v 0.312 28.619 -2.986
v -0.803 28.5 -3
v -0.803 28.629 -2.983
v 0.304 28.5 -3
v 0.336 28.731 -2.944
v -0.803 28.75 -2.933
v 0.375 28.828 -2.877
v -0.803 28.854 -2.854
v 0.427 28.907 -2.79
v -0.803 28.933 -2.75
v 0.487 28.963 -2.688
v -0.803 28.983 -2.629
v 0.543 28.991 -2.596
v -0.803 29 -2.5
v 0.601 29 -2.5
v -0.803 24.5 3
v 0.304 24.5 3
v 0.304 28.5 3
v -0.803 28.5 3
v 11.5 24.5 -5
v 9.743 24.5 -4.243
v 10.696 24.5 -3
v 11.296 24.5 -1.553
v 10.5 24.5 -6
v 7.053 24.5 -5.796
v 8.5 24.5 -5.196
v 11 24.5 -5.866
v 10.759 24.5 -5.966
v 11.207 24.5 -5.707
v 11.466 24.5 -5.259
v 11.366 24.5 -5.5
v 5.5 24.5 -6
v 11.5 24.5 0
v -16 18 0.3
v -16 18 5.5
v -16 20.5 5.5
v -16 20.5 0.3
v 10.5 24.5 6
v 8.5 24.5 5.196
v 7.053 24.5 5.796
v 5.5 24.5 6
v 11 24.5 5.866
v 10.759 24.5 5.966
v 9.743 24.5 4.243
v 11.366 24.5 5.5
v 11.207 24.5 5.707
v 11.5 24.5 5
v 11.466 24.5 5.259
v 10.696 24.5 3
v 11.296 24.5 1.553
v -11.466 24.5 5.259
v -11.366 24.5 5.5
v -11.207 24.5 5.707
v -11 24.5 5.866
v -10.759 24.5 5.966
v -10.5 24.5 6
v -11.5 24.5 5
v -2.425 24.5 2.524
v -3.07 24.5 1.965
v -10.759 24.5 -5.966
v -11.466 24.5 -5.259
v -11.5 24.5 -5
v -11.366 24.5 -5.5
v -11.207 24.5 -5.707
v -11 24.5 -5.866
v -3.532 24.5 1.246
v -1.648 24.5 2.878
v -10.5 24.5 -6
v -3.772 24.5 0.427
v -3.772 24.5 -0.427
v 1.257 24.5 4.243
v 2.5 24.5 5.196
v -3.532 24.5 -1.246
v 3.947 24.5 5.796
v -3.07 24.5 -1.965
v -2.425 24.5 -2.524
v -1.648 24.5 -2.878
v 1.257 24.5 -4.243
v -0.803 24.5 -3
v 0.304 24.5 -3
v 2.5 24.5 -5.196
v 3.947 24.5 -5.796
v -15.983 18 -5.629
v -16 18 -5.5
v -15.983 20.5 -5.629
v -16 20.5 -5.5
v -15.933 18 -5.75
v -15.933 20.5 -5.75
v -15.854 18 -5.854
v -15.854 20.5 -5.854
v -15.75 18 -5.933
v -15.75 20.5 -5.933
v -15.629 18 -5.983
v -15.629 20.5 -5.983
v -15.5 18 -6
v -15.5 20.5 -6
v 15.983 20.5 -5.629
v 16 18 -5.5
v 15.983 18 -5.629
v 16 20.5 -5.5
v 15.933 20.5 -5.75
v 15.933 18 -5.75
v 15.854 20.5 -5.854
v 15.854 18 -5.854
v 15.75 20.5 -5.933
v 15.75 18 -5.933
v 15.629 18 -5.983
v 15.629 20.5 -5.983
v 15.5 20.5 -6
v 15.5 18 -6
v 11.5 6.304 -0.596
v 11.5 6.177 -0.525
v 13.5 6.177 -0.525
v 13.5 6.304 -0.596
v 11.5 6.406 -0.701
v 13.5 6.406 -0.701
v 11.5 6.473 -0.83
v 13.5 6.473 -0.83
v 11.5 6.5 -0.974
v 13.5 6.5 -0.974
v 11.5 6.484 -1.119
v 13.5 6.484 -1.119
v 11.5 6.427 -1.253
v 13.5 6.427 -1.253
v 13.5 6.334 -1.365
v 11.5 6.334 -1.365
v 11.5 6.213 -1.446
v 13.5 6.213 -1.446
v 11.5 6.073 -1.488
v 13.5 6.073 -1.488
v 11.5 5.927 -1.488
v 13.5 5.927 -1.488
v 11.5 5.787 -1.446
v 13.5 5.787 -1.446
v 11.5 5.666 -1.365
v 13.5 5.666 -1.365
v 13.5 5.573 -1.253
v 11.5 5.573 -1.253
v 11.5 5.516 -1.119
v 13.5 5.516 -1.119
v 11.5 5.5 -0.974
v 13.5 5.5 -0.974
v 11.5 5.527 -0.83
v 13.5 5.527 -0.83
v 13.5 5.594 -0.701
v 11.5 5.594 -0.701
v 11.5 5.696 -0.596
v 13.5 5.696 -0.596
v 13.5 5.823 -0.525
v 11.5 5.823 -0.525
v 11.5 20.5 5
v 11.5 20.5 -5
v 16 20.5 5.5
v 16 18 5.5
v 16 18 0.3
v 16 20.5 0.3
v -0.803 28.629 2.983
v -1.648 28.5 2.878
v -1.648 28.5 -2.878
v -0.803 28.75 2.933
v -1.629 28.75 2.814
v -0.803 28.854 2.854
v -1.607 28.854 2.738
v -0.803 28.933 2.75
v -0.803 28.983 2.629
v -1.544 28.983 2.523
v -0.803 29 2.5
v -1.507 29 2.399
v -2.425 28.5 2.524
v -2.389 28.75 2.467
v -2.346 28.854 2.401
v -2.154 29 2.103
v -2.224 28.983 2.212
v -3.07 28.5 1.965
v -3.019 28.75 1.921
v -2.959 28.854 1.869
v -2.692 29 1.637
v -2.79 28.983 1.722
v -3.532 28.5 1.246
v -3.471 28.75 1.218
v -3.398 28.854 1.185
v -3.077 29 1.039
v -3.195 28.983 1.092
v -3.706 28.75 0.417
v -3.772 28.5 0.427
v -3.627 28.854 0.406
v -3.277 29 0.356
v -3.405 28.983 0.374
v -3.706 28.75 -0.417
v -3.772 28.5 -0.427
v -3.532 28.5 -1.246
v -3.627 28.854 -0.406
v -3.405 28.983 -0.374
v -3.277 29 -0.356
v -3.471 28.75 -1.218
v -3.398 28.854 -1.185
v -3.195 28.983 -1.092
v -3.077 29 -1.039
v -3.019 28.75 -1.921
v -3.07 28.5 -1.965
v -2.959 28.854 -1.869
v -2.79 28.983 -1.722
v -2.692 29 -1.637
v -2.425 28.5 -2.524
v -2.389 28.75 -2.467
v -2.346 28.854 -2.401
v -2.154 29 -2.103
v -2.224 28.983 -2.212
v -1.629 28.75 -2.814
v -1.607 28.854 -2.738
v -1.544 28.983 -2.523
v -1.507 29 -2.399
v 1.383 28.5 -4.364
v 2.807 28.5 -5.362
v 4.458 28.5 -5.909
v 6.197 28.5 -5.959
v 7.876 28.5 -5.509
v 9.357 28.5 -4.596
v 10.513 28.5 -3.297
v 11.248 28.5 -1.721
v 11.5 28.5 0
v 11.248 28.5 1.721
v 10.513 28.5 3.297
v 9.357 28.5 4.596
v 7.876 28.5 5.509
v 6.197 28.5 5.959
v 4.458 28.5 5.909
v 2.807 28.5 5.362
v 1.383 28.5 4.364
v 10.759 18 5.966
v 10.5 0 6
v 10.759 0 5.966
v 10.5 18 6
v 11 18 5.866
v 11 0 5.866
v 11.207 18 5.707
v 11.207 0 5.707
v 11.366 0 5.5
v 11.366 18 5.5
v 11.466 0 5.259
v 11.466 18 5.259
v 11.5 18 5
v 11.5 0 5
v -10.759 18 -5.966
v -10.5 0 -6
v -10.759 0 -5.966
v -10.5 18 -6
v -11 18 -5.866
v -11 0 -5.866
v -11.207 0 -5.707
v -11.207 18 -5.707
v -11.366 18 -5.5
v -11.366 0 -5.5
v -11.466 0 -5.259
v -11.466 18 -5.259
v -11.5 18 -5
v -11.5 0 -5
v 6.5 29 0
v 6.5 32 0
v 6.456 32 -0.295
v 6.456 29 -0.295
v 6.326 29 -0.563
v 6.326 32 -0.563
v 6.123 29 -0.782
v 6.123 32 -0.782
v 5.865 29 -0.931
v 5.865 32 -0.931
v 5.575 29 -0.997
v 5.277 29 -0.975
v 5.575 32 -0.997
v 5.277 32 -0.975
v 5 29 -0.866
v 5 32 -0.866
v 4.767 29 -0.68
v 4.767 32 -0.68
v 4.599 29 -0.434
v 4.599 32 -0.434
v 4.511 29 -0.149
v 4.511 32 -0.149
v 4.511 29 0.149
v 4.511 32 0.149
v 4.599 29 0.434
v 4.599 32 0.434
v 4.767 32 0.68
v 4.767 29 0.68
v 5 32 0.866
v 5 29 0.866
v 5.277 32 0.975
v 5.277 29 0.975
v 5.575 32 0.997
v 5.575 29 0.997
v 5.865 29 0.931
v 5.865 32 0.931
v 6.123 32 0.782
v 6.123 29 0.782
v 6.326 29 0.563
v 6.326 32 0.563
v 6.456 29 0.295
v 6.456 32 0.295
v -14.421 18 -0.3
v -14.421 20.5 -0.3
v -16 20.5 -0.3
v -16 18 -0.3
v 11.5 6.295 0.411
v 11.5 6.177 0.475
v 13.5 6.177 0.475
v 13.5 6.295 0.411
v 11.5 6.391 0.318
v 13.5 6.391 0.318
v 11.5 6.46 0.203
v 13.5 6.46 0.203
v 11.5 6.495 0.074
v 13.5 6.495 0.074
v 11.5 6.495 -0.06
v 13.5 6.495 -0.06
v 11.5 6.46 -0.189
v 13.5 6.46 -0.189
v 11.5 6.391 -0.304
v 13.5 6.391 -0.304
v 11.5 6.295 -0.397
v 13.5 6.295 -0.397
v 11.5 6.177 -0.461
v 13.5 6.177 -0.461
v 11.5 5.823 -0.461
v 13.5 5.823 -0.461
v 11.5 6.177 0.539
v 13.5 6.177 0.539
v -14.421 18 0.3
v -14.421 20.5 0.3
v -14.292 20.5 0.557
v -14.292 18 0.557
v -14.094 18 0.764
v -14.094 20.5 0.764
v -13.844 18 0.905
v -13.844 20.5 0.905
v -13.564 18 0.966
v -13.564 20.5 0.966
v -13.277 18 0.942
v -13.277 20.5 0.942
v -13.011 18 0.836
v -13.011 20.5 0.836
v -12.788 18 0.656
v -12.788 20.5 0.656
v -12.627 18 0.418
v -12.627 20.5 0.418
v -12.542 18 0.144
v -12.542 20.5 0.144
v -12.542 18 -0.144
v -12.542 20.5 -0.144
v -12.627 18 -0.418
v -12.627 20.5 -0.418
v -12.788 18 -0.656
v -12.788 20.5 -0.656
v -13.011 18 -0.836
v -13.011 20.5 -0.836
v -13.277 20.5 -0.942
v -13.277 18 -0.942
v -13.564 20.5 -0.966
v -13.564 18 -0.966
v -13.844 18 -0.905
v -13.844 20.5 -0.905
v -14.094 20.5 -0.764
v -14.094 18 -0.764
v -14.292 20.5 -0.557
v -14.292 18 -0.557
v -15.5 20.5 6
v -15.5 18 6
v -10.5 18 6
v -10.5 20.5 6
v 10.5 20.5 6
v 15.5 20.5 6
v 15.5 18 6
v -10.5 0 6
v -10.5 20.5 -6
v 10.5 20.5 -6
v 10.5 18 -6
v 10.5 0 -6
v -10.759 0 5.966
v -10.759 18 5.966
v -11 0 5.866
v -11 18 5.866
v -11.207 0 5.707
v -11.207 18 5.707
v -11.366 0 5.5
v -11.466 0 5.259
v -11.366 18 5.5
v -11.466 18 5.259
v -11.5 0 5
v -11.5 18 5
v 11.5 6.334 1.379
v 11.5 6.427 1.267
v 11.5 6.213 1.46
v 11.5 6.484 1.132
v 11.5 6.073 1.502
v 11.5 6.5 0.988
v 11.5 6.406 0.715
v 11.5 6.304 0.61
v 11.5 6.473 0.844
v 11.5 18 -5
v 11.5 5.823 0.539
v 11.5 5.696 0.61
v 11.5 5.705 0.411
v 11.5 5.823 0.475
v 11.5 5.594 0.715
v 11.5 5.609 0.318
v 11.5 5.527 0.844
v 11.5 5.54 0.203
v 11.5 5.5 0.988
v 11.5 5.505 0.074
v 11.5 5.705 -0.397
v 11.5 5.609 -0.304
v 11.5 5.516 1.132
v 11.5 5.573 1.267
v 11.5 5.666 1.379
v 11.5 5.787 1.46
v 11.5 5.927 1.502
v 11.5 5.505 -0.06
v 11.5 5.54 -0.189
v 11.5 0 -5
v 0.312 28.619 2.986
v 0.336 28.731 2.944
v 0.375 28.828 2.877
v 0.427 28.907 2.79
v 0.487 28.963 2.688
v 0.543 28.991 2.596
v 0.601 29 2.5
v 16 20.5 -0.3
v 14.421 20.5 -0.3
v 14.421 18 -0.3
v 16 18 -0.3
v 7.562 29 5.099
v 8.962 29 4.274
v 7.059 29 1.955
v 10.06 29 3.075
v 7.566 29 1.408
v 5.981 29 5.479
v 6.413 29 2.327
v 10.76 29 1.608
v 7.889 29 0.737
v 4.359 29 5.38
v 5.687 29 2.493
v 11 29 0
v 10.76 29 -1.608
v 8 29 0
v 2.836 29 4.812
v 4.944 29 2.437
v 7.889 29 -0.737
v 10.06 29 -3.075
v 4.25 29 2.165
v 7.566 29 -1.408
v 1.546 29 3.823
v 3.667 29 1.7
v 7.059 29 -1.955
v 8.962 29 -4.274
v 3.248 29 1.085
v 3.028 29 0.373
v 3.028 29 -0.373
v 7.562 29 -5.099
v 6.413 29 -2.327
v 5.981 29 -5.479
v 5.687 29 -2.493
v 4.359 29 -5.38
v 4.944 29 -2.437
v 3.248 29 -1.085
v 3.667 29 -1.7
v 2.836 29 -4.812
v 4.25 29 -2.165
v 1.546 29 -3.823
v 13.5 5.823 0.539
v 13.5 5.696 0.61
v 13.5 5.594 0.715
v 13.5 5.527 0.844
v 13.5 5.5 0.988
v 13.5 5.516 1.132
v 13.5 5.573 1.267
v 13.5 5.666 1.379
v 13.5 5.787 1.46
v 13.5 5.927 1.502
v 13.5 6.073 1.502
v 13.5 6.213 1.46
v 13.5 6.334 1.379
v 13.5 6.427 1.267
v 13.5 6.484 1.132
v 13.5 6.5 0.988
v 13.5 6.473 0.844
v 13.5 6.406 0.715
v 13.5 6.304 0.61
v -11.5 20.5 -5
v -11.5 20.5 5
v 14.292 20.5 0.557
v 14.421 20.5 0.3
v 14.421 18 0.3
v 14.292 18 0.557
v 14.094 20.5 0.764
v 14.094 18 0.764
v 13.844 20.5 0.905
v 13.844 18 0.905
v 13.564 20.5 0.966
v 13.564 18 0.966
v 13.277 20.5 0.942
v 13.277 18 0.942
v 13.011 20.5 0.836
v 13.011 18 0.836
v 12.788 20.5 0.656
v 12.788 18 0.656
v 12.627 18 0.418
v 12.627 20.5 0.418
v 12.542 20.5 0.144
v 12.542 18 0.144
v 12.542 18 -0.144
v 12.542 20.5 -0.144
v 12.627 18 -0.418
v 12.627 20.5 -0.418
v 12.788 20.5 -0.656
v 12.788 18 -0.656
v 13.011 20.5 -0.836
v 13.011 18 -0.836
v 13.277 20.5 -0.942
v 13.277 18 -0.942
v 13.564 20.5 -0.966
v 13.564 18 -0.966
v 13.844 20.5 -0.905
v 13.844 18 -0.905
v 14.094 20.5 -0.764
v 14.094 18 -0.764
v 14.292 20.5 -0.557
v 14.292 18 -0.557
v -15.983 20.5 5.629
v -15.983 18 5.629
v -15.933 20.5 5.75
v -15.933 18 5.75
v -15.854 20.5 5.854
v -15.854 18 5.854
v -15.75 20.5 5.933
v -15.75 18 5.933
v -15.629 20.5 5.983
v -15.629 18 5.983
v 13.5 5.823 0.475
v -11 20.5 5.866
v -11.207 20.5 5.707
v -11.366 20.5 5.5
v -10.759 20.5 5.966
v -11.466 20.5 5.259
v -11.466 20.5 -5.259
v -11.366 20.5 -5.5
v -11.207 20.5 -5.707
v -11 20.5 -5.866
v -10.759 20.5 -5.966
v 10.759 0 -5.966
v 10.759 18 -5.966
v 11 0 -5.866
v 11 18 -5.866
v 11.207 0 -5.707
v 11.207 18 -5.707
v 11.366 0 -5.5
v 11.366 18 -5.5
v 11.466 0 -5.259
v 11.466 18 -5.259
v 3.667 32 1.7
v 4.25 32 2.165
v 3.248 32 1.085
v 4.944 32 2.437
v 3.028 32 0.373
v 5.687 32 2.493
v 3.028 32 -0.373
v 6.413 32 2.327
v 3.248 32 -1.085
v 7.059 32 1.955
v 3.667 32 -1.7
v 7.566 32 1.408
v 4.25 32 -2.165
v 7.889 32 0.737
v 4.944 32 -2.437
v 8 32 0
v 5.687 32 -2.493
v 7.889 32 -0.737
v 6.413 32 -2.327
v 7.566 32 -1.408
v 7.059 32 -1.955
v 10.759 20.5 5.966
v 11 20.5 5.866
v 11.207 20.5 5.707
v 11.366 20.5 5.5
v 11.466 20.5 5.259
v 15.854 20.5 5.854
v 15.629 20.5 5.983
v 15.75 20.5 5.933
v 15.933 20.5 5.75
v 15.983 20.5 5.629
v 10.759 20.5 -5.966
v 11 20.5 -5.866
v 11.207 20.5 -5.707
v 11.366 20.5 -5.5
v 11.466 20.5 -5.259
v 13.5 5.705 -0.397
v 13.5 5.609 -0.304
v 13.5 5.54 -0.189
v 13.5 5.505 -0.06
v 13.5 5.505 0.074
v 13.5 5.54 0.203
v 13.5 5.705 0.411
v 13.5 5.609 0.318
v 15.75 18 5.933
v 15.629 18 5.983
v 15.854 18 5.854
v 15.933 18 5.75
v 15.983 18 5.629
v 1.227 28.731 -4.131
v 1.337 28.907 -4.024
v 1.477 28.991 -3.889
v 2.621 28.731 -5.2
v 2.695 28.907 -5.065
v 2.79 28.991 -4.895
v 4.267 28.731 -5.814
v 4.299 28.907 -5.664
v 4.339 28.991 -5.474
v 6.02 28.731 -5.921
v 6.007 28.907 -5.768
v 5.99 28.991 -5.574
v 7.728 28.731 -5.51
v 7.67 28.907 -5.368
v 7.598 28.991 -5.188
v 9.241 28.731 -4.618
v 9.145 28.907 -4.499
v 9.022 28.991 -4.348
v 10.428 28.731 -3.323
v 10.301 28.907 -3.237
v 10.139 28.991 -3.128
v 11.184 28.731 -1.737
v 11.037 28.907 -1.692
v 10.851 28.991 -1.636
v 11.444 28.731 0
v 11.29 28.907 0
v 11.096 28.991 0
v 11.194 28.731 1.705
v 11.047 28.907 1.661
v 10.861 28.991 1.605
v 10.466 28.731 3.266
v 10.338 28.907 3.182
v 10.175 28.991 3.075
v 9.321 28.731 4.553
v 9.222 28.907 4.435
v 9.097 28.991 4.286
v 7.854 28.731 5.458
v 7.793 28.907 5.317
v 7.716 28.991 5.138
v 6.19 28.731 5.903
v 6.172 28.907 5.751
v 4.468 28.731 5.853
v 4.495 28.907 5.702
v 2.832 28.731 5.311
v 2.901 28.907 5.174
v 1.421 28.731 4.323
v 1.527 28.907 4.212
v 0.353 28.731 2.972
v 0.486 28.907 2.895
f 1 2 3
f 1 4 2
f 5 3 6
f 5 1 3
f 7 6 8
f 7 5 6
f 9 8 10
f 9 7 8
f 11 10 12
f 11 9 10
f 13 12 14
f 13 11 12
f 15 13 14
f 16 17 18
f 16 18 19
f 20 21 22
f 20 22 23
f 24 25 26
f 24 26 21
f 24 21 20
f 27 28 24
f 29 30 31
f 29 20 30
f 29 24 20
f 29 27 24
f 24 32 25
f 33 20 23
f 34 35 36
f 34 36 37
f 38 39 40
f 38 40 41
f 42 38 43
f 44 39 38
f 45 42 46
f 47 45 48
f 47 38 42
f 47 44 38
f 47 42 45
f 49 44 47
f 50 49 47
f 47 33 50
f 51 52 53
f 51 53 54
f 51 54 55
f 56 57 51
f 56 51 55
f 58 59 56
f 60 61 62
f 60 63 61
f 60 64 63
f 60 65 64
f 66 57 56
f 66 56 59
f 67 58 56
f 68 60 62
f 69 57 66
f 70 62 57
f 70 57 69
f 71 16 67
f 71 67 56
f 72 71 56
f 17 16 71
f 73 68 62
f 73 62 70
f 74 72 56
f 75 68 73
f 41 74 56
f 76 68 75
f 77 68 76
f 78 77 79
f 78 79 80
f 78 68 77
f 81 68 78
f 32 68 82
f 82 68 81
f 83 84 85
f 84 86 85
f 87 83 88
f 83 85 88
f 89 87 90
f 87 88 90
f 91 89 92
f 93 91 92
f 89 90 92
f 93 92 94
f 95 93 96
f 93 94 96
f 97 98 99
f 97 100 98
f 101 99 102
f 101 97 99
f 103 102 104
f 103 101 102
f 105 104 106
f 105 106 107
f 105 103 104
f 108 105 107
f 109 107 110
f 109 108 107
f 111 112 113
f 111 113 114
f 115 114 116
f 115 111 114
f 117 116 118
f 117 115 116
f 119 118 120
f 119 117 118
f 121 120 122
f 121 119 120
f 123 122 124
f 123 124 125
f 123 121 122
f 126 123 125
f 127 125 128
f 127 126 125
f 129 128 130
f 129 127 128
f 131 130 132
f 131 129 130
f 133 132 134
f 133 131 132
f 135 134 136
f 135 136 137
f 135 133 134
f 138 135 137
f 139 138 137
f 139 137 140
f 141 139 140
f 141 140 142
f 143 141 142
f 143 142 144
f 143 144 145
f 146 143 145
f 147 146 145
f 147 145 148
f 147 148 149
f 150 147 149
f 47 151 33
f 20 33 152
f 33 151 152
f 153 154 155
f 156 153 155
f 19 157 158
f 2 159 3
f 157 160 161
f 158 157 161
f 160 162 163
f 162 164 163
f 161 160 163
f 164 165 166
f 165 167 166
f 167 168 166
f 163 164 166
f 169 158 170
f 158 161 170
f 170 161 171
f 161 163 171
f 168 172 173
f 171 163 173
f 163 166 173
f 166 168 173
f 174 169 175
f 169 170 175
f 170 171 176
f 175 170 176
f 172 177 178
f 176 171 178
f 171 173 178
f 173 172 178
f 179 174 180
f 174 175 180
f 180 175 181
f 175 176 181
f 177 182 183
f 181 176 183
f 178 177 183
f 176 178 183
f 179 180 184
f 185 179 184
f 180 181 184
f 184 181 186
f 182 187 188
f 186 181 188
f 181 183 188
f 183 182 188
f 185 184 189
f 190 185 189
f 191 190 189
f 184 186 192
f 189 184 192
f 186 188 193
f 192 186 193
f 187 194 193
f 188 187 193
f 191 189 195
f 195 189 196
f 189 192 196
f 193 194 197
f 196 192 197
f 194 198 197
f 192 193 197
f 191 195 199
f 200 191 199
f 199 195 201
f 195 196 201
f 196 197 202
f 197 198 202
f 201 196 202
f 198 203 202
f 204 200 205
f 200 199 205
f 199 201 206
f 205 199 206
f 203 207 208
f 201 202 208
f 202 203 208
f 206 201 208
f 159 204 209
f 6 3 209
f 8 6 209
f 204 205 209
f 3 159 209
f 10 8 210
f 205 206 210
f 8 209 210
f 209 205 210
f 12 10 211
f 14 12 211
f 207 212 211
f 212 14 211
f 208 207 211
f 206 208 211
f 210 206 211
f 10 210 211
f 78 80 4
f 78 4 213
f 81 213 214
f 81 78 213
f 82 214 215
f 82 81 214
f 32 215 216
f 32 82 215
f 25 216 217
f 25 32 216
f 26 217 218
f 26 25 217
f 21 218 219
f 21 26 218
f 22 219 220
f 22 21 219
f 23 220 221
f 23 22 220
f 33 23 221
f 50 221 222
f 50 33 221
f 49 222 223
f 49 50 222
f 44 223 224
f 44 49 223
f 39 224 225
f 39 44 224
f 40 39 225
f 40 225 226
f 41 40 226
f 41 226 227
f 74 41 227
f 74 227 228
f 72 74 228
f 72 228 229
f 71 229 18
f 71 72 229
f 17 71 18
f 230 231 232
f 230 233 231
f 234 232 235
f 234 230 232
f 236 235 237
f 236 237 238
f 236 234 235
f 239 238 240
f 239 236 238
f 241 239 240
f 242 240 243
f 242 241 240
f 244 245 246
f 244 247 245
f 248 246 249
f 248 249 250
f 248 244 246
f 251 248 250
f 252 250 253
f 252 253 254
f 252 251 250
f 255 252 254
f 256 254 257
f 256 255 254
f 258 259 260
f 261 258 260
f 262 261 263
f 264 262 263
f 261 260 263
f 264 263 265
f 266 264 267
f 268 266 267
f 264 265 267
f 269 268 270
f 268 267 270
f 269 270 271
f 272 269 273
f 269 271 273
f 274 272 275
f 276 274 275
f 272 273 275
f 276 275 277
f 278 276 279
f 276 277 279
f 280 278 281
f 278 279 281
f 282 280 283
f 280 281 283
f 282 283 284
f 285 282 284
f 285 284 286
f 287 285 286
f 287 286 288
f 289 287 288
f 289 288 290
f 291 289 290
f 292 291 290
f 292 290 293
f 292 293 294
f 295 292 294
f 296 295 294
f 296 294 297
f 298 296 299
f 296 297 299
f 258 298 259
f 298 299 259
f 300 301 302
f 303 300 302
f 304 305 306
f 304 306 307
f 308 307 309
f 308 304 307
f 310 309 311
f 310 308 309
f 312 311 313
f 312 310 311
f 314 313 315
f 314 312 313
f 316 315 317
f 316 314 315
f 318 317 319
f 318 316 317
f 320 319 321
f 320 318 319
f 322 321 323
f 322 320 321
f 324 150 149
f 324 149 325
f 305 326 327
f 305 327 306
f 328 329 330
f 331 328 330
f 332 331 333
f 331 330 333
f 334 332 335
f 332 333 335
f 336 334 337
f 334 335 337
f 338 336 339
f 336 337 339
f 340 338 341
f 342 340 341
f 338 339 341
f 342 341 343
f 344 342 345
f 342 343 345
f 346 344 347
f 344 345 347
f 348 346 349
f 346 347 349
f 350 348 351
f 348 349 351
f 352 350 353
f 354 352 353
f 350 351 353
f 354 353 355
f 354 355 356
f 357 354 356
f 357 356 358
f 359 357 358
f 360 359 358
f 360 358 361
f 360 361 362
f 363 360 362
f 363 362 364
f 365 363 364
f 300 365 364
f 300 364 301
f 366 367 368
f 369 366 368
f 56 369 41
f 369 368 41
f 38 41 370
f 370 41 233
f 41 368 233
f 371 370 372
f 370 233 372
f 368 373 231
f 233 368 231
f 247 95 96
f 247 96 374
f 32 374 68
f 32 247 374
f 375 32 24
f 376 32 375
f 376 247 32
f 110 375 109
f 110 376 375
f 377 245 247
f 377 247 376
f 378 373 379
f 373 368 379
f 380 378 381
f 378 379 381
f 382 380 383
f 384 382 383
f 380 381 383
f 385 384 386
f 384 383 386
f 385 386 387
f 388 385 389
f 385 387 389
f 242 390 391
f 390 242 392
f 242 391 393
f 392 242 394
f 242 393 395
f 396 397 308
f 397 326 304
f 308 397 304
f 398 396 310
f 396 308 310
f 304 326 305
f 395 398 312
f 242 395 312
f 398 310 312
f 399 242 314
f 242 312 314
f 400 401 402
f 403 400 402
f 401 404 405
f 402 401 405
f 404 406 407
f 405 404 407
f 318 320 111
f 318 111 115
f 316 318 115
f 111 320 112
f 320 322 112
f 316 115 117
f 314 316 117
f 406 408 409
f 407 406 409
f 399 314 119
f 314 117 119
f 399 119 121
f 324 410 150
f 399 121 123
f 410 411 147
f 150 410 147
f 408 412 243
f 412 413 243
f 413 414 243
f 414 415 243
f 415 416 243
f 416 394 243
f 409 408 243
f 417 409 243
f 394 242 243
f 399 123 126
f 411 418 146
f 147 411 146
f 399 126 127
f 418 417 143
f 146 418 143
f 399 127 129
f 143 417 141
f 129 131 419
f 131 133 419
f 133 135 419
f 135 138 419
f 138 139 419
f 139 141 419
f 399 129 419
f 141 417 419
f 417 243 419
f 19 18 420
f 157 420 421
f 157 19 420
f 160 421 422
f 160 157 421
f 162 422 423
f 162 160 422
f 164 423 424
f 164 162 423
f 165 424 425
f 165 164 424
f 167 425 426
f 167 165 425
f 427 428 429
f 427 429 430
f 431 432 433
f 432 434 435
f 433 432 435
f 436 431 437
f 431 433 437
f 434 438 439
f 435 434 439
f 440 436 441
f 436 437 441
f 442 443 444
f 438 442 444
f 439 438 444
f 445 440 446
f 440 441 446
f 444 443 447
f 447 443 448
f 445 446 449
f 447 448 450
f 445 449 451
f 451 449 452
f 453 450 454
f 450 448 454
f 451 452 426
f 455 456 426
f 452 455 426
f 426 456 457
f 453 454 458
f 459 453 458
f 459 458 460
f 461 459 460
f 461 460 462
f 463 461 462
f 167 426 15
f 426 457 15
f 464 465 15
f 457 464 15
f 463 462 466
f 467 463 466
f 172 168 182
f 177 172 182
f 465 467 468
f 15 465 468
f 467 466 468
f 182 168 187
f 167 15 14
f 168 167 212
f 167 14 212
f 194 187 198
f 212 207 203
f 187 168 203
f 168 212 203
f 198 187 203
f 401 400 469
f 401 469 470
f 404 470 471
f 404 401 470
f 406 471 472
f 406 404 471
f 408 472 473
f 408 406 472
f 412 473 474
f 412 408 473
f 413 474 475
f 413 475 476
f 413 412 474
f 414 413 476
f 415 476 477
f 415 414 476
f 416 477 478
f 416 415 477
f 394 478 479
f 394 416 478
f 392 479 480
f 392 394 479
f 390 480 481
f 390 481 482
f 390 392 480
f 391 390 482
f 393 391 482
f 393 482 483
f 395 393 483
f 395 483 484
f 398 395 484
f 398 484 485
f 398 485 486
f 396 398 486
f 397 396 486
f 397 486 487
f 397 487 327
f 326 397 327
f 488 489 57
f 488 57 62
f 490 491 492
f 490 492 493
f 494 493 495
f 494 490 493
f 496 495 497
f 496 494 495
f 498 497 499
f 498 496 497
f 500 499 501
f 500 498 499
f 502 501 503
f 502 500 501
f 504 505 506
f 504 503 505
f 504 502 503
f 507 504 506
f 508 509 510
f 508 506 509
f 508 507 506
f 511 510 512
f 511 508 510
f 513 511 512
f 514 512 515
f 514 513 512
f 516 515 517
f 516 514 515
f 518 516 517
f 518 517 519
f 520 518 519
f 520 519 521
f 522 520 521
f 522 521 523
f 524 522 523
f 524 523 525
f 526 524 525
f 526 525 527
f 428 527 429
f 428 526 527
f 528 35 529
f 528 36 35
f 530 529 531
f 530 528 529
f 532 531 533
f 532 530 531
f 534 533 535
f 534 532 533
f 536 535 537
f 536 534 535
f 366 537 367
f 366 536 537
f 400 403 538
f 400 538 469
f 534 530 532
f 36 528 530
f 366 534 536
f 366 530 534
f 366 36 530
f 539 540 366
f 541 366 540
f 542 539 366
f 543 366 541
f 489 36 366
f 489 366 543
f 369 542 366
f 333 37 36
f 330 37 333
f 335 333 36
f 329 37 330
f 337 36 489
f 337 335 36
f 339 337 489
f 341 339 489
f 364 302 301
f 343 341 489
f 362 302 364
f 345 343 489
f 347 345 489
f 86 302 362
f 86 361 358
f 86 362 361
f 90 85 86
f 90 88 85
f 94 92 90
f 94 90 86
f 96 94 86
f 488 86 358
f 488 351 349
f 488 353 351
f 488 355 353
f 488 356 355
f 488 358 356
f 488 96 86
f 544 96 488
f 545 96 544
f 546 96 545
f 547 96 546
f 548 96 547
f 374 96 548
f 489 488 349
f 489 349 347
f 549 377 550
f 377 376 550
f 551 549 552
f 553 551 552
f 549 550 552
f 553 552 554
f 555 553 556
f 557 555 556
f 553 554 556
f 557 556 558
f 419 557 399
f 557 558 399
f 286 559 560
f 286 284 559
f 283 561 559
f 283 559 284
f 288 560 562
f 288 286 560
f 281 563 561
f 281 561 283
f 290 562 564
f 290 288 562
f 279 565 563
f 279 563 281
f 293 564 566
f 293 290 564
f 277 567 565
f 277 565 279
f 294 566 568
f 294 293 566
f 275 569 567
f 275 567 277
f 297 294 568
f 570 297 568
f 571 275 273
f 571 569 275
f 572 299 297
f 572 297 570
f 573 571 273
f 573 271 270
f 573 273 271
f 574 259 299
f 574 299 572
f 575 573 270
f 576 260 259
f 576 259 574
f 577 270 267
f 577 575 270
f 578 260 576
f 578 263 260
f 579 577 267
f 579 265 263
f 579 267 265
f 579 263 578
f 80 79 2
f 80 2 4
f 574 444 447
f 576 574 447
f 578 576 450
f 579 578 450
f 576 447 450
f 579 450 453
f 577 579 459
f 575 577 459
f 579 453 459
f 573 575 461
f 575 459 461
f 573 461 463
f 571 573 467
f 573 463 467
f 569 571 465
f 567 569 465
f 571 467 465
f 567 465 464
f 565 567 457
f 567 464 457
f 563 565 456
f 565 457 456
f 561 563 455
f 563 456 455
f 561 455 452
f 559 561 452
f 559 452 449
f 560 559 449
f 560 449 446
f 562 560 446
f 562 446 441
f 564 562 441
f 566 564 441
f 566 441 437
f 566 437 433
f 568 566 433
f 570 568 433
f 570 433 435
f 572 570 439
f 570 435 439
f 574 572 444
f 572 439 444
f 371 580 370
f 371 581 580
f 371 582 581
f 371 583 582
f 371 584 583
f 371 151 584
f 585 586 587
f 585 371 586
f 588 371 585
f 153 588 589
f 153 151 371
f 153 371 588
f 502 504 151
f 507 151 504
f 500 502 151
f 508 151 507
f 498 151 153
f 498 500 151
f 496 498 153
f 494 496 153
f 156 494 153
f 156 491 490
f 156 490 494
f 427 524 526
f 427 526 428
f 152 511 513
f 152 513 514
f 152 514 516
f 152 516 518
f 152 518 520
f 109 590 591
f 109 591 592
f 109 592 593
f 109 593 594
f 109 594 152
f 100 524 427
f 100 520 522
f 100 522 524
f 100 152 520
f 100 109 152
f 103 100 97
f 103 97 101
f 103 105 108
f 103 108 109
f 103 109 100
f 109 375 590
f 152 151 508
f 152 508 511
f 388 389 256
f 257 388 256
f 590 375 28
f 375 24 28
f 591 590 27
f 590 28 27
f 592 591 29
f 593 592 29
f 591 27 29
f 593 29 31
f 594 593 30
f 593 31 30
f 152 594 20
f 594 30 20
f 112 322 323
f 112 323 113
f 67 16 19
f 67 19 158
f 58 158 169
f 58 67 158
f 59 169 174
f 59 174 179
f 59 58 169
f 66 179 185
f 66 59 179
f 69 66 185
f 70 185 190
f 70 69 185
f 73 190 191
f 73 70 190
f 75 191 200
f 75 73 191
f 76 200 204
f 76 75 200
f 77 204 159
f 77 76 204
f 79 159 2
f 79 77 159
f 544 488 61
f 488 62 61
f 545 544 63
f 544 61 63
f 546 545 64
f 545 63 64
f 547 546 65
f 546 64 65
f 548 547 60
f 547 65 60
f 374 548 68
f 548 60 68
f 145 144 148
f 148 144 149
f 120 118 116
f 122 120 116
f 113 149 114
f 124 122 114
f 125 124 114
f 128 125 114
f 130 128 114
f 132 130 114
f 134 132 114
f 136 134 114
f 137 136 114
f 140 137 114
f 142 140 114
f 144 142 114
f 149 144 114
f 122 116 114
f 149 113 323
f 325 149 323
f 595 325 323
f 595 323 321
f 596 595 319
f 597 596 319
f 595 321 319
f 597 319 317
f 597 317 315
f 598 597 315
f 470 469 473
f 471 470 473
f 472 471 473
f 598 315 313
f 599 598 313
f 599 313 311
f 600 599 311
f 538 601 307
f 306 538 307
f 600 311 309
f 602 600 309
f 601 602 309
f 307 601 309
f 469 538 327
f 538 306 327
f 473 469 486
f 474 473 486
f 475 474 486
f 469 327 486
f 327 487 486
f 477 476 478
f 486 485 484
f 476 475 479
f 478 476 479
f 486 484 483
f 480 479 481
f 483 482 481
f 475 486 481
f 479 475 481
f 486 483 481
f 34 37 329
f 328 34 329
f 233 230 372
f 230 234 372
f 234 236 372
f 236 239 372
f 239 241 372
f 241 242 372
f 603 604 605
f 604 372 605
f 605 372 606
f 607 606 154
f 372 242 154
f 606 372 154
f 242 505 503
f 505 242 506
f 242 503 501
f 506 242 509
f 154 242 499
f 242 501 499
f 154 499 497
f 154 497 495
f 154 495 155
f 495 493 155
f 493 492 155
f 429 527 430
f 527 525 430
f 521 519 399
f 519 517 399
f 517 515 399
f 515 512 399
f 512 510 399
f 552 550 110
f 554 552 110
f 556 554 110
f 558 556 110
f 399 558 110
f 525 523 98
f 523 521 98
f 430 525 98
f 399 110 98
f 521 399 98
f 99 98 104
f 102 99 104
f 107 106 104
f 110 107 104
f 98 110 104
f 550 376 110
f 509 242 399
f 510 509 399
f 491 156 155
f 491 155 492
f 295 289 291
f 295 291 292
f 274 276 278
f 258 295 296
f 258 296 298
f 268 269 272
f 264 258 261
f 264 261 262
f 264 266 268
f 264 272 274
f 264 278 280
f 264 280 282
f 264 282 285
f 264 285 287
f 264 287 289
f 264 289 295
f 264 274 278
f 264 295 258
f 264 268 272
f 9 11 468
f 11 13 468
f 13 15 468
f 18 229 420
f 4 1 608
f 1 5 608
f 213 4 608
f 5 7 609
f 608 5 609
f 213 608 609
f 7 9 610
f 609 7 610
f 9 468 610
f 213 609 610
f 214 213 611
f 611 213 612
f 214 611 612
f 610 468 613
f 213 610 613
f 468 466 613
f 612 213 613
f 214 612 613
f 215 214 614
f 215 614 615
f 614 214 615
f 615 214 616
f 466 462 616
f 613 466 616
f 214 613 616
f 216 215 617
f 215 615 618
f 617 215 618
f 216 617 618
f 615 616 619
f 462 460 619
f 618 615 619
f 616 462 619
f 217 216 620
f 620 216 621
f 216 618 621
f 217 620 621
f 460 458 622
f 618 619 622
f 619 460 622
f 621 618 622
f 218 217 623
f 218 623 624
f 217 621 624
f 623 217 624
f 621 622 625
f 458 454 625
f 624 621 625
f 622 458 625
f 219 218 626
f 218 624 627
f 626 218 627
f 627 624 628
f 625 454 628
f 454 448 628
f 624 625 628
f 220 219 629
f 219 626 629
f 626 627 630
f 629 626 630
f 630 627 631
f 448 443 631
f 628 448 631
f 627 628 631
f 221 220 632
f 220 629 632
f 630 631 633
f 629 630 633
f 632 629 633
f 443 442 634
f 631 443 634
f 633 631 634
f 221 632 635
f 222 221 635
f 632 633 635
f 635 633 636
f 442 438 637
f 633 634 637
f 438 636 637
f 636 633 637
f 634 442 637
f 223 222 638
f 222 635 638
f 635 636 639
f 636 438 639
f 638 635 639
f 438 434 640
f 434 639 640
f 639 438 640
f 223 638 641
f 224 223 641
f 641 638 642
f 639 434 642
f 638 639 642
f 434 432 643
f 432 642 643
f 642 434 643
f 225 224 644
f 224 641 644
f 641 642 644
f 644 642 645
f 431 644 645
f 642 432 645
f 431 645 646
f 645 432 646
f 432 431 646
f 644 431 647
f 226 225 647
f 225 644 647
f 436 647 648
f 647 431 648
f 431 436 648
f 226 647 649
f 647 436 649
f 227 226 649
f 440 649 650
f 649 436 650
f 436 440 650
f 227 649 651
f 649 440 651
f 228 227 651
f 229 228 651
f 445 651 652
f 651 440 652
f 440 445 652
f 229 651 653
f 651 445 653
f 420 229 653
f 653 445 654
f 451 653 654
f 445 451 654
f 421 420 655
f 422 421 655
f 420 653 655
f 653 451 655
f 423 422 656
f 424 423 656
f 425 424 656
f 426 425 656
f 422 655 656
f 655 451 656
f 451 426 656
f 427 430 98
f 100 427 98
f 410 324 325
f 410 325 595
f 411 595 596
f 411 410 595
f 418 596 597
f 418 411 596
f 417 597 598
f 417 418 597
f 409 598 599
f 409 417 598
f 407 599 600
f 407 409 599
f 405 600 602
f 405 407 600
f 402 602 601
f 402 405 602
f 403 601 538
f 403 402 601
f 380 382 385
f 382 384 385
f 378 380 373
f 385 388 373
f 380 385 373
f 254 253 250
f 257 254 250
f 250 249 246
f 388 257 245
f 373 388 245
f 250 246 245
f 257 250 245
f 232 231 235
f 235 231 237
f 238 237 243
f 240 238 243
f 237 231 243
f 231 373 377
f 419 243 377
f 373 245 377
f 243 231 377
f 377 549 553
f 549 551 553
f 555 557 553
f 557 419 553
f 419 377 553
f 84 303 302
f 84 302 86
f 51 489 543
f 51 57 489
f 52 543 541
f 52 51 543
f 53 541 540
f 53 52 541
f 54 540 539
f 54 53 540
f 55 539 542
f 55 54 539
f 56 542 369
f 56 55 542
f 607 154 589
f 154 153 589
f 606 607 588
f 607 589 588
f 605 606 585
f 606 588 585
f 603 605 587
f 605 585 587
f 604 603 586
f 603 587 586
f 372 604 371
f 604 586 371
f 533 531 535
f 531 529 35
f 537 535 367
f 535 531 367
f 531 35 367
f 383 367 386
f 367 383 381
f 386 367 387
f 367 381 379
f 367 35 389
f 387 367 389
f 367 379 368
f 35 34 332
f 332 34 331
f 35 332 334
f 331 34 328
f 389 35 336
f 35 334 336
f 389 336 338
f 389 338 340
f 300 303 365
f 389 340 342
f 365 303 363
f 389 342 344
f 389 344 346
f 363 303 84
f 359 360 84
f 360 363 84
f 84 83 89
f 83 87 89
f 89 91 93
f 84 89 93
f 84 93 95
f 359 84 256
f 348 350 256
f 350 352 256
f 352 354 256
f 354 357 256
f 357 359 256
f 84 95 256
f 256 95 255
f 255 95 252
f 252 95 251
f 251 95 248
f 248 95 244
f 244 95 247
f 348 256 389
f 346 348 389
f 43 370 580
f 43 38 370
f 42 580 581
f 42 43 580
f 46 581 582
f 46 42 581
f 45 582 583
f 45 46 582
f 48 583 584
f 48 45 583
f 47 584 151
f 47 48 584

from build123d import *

# Parameters (mm, degrees)
SKETCH1_W            = 23
SKETCH1_H            = 12
BOSS_EXTRUDE1_DEPTH  = 18
SKETCH2_W            = 32
SKETCH2_H            = 12
BOSS_EXTRUDE2_DEPTH  = 2.5
SKETCH3_W            = 23
SKETCH3_H            = 12
BOSS_EXTRUDE3_DEPTH  = 4
BOSS_EXTRUDE4_DEPTH  = 4.5
FILLET1_R            = 1
FILLET2_R            = 0.5
CUT_EXTRUDE2_DEPTH   = 21.5
SKETCH5_R            = 2.5
BOSS_EXTRUDE5_DEPTH  = 3
SKETCH6_R            = 1
CUT_EXTRUDE1_DEPTH   = 3
BOSS_EXTRUDE11_DEPTH = 2
FILLET3_R            = 0.5


with BuildPart() as part:
    # Sketch1 → Boss-Extrude1 (new body)
    with BuildSketch(Plane(origin=(0, 0, 0), x_dir=(1, 0, 0), z_dir=(0, 1, 0))):
        Rectangle(SKETCH1_W, SKETCH1_H)
    extrude(amount=BOSS_EXTRUDE1_DEPTH)

    # Sketch2 → Boss-Extrude2 (add)
    with BuildSketch(Plane(origin=(0, 18, 0), x_dir=(1, 0, 0), z_dir=(0, 1, 0))):
        Rectangle(SKETCH2_W, SKETCH2_H)
    extrude(amount=BOSS_EXTRUDE2_DEPTH)

    # Sketch3 → Boss-Extrude3 (add)
    with BuildSketch(Plane(origin=(0, 20.5, 0), x_dir=(1, 0, 0), z_dir=(0, 1, 0))):
        Rectangle(SKETCH3_W, SKETCH3_H)
    extrude(amount=BOSS_EXTRUDE3_DEPTH)

    # Sketch4 → Boss-Extrude4 (add)
    with BuildSketch(Plane(origin=(0, 24.5, 0), x_dir=(1, 0, 0), z_dir=(0, 1, 0))):
        with BuildLine():
            Line((-0.802804538, 3), (0.303847577, 3))
            ThreePointArc((0.303847577, 3), (11.5, 0), (0.303847577, -3))
            Line((0.303847577, -3), (-0.802804538, -3))
            ThreePointArc((-0.802804538, -3), (-3.802804538, 0), (-0.802804538, 3))
        make_face()
    extrude(amount=BOSS_EXTRUDE4_DEPTH)

    # Fillet1
    fillet1_edges = [part.edges().sort_by_distance(p)[0] for p in [
        (11.5, 22.5, 6),
        (11.5, 22.5, -6),
        (-11.5, 22.5, -6),
        (-11.5, 22.5, 6),
        (11.5, 9, 6),
        (-11.5, 9, 6),
        (-11.5, 9, -6),
        (11.5, 9, -6),
    ]]
    fillet(fillet1_edges, radius=FILLET1_R)

    # Fillet2
    fillet2_edges = [part.edges().sort_by_distance(p)[0] for p in [
        (16, 19.25, 6),
        (16, 19.25, -6),
        (-16, 19.25, -6),
        (-16, 19.25, 6),
    ]]
    fillet(fillet2_edges, radius=FILLET2_R)

    # Sketch7 → Cut-Extrude2 (cut, through all)
    with BuildSketch(Plane(origin=(0, 20.5, 0), x_dir=(1, 0, 0), z_dir=(0, 1, 0))):
        with BuildLine():
            Line((14.420576737, 0.3), (16, 0.3))
            Line((16, 0.3), (16, -0.3))
            Line((16, -0.3), (14.420576737, -0.3))
            ThreePointArc((14.420576737, -0.3), (12.53177403, 0), (14.420576737, 0.3))
        make_face()
    cut_extrude2 = extrude(amount=-CUT_EXTRUDE2_DEPTH, mode=Mode.SUBTRACT)

    # Mirror1: Cut-Extrude2 across plane
    add(cut_extrude2.mirror(Plane(origin=(0, 0, 0), x_dir=(0, 0, 1), z_dir=(1, 0, 0))), mode=Mode.SUBTRACT)

    # Sketch5 → Boss-Extrude5 (add)
    with BuildSketch(Plane(origin=(0, 29, 0), x_dir=(1, 0, 0), z_dir=(0, 1, 0))):
        with Locations((5.5, 0)):
            Circle(SKETCH5_R)
    extrude(amount=BOSS_EXTRUDE5_DEPTH)

    # Sketch6 → Cut-Extrude1 (cut)
    with BuildSketch(Plane(origin=(0, 32, 0), x_dir=(1, 0, 0), z_dir=(0, 1, 0))):
        with Locations((5.5, 0)):
            Circle(SKETCH6_R)
    extrude(amount=-CUT_EXTRUDE1_DEPTH, mode=Mode.SUBTRACT)

    # Sketch8 → Boss-Extrude11 (add)
    with BuildSketch(Plane(origin=(11.5, 0, 0), x_dir=(0, 0, -1), z_dir=(1, 0, 0))):
        with BuildLine():
            Line((-0.539222972, 6.176789317), (-0.474627778, 6.176789317))
            ThreePointArc((-0.474627778, 6.176789317), (-0.006925375, 6.5), (0.460777028, 6.176789317))
            Line((0.460777028, 6.176789317), (0.525372222, 6.176789317))
            ThreePointArc((0.525372222, 6.176789317), (1.493074625, 6), (0.525372222, 5.823210683))
            Line((0.525372222, 5.823210683), (0.460777028, 5.823210683))
            ThreePointArc((0.460777028, 5.823210683), (-0.006925375, 5.5), (-0.474627778, 5.823210683))
            Line((-0.474627778, 5.823210683), (-0.539222972, 5.823210683))
            ThreePointArc((-0.539222972, 5.823210683), (-1.506925375, 6), (-0.539222972, 6.176789317))
        make_face()
    extrude(amount=BOSS_EXTRUDE11_DEPTH)

    # Fillet3
    fillet3_edges = [part.edges().sort_by_distance(p)[0] for p in [
        (-3.802804538, 29, 0),
        (-0.249478481, 29, 3),
        (11.5, 29, 0),
        (-0.249478481, 29, -3),
    ]]
    fillet(fillet3_edges, radius=FILLET3_R)


solid = part.part
